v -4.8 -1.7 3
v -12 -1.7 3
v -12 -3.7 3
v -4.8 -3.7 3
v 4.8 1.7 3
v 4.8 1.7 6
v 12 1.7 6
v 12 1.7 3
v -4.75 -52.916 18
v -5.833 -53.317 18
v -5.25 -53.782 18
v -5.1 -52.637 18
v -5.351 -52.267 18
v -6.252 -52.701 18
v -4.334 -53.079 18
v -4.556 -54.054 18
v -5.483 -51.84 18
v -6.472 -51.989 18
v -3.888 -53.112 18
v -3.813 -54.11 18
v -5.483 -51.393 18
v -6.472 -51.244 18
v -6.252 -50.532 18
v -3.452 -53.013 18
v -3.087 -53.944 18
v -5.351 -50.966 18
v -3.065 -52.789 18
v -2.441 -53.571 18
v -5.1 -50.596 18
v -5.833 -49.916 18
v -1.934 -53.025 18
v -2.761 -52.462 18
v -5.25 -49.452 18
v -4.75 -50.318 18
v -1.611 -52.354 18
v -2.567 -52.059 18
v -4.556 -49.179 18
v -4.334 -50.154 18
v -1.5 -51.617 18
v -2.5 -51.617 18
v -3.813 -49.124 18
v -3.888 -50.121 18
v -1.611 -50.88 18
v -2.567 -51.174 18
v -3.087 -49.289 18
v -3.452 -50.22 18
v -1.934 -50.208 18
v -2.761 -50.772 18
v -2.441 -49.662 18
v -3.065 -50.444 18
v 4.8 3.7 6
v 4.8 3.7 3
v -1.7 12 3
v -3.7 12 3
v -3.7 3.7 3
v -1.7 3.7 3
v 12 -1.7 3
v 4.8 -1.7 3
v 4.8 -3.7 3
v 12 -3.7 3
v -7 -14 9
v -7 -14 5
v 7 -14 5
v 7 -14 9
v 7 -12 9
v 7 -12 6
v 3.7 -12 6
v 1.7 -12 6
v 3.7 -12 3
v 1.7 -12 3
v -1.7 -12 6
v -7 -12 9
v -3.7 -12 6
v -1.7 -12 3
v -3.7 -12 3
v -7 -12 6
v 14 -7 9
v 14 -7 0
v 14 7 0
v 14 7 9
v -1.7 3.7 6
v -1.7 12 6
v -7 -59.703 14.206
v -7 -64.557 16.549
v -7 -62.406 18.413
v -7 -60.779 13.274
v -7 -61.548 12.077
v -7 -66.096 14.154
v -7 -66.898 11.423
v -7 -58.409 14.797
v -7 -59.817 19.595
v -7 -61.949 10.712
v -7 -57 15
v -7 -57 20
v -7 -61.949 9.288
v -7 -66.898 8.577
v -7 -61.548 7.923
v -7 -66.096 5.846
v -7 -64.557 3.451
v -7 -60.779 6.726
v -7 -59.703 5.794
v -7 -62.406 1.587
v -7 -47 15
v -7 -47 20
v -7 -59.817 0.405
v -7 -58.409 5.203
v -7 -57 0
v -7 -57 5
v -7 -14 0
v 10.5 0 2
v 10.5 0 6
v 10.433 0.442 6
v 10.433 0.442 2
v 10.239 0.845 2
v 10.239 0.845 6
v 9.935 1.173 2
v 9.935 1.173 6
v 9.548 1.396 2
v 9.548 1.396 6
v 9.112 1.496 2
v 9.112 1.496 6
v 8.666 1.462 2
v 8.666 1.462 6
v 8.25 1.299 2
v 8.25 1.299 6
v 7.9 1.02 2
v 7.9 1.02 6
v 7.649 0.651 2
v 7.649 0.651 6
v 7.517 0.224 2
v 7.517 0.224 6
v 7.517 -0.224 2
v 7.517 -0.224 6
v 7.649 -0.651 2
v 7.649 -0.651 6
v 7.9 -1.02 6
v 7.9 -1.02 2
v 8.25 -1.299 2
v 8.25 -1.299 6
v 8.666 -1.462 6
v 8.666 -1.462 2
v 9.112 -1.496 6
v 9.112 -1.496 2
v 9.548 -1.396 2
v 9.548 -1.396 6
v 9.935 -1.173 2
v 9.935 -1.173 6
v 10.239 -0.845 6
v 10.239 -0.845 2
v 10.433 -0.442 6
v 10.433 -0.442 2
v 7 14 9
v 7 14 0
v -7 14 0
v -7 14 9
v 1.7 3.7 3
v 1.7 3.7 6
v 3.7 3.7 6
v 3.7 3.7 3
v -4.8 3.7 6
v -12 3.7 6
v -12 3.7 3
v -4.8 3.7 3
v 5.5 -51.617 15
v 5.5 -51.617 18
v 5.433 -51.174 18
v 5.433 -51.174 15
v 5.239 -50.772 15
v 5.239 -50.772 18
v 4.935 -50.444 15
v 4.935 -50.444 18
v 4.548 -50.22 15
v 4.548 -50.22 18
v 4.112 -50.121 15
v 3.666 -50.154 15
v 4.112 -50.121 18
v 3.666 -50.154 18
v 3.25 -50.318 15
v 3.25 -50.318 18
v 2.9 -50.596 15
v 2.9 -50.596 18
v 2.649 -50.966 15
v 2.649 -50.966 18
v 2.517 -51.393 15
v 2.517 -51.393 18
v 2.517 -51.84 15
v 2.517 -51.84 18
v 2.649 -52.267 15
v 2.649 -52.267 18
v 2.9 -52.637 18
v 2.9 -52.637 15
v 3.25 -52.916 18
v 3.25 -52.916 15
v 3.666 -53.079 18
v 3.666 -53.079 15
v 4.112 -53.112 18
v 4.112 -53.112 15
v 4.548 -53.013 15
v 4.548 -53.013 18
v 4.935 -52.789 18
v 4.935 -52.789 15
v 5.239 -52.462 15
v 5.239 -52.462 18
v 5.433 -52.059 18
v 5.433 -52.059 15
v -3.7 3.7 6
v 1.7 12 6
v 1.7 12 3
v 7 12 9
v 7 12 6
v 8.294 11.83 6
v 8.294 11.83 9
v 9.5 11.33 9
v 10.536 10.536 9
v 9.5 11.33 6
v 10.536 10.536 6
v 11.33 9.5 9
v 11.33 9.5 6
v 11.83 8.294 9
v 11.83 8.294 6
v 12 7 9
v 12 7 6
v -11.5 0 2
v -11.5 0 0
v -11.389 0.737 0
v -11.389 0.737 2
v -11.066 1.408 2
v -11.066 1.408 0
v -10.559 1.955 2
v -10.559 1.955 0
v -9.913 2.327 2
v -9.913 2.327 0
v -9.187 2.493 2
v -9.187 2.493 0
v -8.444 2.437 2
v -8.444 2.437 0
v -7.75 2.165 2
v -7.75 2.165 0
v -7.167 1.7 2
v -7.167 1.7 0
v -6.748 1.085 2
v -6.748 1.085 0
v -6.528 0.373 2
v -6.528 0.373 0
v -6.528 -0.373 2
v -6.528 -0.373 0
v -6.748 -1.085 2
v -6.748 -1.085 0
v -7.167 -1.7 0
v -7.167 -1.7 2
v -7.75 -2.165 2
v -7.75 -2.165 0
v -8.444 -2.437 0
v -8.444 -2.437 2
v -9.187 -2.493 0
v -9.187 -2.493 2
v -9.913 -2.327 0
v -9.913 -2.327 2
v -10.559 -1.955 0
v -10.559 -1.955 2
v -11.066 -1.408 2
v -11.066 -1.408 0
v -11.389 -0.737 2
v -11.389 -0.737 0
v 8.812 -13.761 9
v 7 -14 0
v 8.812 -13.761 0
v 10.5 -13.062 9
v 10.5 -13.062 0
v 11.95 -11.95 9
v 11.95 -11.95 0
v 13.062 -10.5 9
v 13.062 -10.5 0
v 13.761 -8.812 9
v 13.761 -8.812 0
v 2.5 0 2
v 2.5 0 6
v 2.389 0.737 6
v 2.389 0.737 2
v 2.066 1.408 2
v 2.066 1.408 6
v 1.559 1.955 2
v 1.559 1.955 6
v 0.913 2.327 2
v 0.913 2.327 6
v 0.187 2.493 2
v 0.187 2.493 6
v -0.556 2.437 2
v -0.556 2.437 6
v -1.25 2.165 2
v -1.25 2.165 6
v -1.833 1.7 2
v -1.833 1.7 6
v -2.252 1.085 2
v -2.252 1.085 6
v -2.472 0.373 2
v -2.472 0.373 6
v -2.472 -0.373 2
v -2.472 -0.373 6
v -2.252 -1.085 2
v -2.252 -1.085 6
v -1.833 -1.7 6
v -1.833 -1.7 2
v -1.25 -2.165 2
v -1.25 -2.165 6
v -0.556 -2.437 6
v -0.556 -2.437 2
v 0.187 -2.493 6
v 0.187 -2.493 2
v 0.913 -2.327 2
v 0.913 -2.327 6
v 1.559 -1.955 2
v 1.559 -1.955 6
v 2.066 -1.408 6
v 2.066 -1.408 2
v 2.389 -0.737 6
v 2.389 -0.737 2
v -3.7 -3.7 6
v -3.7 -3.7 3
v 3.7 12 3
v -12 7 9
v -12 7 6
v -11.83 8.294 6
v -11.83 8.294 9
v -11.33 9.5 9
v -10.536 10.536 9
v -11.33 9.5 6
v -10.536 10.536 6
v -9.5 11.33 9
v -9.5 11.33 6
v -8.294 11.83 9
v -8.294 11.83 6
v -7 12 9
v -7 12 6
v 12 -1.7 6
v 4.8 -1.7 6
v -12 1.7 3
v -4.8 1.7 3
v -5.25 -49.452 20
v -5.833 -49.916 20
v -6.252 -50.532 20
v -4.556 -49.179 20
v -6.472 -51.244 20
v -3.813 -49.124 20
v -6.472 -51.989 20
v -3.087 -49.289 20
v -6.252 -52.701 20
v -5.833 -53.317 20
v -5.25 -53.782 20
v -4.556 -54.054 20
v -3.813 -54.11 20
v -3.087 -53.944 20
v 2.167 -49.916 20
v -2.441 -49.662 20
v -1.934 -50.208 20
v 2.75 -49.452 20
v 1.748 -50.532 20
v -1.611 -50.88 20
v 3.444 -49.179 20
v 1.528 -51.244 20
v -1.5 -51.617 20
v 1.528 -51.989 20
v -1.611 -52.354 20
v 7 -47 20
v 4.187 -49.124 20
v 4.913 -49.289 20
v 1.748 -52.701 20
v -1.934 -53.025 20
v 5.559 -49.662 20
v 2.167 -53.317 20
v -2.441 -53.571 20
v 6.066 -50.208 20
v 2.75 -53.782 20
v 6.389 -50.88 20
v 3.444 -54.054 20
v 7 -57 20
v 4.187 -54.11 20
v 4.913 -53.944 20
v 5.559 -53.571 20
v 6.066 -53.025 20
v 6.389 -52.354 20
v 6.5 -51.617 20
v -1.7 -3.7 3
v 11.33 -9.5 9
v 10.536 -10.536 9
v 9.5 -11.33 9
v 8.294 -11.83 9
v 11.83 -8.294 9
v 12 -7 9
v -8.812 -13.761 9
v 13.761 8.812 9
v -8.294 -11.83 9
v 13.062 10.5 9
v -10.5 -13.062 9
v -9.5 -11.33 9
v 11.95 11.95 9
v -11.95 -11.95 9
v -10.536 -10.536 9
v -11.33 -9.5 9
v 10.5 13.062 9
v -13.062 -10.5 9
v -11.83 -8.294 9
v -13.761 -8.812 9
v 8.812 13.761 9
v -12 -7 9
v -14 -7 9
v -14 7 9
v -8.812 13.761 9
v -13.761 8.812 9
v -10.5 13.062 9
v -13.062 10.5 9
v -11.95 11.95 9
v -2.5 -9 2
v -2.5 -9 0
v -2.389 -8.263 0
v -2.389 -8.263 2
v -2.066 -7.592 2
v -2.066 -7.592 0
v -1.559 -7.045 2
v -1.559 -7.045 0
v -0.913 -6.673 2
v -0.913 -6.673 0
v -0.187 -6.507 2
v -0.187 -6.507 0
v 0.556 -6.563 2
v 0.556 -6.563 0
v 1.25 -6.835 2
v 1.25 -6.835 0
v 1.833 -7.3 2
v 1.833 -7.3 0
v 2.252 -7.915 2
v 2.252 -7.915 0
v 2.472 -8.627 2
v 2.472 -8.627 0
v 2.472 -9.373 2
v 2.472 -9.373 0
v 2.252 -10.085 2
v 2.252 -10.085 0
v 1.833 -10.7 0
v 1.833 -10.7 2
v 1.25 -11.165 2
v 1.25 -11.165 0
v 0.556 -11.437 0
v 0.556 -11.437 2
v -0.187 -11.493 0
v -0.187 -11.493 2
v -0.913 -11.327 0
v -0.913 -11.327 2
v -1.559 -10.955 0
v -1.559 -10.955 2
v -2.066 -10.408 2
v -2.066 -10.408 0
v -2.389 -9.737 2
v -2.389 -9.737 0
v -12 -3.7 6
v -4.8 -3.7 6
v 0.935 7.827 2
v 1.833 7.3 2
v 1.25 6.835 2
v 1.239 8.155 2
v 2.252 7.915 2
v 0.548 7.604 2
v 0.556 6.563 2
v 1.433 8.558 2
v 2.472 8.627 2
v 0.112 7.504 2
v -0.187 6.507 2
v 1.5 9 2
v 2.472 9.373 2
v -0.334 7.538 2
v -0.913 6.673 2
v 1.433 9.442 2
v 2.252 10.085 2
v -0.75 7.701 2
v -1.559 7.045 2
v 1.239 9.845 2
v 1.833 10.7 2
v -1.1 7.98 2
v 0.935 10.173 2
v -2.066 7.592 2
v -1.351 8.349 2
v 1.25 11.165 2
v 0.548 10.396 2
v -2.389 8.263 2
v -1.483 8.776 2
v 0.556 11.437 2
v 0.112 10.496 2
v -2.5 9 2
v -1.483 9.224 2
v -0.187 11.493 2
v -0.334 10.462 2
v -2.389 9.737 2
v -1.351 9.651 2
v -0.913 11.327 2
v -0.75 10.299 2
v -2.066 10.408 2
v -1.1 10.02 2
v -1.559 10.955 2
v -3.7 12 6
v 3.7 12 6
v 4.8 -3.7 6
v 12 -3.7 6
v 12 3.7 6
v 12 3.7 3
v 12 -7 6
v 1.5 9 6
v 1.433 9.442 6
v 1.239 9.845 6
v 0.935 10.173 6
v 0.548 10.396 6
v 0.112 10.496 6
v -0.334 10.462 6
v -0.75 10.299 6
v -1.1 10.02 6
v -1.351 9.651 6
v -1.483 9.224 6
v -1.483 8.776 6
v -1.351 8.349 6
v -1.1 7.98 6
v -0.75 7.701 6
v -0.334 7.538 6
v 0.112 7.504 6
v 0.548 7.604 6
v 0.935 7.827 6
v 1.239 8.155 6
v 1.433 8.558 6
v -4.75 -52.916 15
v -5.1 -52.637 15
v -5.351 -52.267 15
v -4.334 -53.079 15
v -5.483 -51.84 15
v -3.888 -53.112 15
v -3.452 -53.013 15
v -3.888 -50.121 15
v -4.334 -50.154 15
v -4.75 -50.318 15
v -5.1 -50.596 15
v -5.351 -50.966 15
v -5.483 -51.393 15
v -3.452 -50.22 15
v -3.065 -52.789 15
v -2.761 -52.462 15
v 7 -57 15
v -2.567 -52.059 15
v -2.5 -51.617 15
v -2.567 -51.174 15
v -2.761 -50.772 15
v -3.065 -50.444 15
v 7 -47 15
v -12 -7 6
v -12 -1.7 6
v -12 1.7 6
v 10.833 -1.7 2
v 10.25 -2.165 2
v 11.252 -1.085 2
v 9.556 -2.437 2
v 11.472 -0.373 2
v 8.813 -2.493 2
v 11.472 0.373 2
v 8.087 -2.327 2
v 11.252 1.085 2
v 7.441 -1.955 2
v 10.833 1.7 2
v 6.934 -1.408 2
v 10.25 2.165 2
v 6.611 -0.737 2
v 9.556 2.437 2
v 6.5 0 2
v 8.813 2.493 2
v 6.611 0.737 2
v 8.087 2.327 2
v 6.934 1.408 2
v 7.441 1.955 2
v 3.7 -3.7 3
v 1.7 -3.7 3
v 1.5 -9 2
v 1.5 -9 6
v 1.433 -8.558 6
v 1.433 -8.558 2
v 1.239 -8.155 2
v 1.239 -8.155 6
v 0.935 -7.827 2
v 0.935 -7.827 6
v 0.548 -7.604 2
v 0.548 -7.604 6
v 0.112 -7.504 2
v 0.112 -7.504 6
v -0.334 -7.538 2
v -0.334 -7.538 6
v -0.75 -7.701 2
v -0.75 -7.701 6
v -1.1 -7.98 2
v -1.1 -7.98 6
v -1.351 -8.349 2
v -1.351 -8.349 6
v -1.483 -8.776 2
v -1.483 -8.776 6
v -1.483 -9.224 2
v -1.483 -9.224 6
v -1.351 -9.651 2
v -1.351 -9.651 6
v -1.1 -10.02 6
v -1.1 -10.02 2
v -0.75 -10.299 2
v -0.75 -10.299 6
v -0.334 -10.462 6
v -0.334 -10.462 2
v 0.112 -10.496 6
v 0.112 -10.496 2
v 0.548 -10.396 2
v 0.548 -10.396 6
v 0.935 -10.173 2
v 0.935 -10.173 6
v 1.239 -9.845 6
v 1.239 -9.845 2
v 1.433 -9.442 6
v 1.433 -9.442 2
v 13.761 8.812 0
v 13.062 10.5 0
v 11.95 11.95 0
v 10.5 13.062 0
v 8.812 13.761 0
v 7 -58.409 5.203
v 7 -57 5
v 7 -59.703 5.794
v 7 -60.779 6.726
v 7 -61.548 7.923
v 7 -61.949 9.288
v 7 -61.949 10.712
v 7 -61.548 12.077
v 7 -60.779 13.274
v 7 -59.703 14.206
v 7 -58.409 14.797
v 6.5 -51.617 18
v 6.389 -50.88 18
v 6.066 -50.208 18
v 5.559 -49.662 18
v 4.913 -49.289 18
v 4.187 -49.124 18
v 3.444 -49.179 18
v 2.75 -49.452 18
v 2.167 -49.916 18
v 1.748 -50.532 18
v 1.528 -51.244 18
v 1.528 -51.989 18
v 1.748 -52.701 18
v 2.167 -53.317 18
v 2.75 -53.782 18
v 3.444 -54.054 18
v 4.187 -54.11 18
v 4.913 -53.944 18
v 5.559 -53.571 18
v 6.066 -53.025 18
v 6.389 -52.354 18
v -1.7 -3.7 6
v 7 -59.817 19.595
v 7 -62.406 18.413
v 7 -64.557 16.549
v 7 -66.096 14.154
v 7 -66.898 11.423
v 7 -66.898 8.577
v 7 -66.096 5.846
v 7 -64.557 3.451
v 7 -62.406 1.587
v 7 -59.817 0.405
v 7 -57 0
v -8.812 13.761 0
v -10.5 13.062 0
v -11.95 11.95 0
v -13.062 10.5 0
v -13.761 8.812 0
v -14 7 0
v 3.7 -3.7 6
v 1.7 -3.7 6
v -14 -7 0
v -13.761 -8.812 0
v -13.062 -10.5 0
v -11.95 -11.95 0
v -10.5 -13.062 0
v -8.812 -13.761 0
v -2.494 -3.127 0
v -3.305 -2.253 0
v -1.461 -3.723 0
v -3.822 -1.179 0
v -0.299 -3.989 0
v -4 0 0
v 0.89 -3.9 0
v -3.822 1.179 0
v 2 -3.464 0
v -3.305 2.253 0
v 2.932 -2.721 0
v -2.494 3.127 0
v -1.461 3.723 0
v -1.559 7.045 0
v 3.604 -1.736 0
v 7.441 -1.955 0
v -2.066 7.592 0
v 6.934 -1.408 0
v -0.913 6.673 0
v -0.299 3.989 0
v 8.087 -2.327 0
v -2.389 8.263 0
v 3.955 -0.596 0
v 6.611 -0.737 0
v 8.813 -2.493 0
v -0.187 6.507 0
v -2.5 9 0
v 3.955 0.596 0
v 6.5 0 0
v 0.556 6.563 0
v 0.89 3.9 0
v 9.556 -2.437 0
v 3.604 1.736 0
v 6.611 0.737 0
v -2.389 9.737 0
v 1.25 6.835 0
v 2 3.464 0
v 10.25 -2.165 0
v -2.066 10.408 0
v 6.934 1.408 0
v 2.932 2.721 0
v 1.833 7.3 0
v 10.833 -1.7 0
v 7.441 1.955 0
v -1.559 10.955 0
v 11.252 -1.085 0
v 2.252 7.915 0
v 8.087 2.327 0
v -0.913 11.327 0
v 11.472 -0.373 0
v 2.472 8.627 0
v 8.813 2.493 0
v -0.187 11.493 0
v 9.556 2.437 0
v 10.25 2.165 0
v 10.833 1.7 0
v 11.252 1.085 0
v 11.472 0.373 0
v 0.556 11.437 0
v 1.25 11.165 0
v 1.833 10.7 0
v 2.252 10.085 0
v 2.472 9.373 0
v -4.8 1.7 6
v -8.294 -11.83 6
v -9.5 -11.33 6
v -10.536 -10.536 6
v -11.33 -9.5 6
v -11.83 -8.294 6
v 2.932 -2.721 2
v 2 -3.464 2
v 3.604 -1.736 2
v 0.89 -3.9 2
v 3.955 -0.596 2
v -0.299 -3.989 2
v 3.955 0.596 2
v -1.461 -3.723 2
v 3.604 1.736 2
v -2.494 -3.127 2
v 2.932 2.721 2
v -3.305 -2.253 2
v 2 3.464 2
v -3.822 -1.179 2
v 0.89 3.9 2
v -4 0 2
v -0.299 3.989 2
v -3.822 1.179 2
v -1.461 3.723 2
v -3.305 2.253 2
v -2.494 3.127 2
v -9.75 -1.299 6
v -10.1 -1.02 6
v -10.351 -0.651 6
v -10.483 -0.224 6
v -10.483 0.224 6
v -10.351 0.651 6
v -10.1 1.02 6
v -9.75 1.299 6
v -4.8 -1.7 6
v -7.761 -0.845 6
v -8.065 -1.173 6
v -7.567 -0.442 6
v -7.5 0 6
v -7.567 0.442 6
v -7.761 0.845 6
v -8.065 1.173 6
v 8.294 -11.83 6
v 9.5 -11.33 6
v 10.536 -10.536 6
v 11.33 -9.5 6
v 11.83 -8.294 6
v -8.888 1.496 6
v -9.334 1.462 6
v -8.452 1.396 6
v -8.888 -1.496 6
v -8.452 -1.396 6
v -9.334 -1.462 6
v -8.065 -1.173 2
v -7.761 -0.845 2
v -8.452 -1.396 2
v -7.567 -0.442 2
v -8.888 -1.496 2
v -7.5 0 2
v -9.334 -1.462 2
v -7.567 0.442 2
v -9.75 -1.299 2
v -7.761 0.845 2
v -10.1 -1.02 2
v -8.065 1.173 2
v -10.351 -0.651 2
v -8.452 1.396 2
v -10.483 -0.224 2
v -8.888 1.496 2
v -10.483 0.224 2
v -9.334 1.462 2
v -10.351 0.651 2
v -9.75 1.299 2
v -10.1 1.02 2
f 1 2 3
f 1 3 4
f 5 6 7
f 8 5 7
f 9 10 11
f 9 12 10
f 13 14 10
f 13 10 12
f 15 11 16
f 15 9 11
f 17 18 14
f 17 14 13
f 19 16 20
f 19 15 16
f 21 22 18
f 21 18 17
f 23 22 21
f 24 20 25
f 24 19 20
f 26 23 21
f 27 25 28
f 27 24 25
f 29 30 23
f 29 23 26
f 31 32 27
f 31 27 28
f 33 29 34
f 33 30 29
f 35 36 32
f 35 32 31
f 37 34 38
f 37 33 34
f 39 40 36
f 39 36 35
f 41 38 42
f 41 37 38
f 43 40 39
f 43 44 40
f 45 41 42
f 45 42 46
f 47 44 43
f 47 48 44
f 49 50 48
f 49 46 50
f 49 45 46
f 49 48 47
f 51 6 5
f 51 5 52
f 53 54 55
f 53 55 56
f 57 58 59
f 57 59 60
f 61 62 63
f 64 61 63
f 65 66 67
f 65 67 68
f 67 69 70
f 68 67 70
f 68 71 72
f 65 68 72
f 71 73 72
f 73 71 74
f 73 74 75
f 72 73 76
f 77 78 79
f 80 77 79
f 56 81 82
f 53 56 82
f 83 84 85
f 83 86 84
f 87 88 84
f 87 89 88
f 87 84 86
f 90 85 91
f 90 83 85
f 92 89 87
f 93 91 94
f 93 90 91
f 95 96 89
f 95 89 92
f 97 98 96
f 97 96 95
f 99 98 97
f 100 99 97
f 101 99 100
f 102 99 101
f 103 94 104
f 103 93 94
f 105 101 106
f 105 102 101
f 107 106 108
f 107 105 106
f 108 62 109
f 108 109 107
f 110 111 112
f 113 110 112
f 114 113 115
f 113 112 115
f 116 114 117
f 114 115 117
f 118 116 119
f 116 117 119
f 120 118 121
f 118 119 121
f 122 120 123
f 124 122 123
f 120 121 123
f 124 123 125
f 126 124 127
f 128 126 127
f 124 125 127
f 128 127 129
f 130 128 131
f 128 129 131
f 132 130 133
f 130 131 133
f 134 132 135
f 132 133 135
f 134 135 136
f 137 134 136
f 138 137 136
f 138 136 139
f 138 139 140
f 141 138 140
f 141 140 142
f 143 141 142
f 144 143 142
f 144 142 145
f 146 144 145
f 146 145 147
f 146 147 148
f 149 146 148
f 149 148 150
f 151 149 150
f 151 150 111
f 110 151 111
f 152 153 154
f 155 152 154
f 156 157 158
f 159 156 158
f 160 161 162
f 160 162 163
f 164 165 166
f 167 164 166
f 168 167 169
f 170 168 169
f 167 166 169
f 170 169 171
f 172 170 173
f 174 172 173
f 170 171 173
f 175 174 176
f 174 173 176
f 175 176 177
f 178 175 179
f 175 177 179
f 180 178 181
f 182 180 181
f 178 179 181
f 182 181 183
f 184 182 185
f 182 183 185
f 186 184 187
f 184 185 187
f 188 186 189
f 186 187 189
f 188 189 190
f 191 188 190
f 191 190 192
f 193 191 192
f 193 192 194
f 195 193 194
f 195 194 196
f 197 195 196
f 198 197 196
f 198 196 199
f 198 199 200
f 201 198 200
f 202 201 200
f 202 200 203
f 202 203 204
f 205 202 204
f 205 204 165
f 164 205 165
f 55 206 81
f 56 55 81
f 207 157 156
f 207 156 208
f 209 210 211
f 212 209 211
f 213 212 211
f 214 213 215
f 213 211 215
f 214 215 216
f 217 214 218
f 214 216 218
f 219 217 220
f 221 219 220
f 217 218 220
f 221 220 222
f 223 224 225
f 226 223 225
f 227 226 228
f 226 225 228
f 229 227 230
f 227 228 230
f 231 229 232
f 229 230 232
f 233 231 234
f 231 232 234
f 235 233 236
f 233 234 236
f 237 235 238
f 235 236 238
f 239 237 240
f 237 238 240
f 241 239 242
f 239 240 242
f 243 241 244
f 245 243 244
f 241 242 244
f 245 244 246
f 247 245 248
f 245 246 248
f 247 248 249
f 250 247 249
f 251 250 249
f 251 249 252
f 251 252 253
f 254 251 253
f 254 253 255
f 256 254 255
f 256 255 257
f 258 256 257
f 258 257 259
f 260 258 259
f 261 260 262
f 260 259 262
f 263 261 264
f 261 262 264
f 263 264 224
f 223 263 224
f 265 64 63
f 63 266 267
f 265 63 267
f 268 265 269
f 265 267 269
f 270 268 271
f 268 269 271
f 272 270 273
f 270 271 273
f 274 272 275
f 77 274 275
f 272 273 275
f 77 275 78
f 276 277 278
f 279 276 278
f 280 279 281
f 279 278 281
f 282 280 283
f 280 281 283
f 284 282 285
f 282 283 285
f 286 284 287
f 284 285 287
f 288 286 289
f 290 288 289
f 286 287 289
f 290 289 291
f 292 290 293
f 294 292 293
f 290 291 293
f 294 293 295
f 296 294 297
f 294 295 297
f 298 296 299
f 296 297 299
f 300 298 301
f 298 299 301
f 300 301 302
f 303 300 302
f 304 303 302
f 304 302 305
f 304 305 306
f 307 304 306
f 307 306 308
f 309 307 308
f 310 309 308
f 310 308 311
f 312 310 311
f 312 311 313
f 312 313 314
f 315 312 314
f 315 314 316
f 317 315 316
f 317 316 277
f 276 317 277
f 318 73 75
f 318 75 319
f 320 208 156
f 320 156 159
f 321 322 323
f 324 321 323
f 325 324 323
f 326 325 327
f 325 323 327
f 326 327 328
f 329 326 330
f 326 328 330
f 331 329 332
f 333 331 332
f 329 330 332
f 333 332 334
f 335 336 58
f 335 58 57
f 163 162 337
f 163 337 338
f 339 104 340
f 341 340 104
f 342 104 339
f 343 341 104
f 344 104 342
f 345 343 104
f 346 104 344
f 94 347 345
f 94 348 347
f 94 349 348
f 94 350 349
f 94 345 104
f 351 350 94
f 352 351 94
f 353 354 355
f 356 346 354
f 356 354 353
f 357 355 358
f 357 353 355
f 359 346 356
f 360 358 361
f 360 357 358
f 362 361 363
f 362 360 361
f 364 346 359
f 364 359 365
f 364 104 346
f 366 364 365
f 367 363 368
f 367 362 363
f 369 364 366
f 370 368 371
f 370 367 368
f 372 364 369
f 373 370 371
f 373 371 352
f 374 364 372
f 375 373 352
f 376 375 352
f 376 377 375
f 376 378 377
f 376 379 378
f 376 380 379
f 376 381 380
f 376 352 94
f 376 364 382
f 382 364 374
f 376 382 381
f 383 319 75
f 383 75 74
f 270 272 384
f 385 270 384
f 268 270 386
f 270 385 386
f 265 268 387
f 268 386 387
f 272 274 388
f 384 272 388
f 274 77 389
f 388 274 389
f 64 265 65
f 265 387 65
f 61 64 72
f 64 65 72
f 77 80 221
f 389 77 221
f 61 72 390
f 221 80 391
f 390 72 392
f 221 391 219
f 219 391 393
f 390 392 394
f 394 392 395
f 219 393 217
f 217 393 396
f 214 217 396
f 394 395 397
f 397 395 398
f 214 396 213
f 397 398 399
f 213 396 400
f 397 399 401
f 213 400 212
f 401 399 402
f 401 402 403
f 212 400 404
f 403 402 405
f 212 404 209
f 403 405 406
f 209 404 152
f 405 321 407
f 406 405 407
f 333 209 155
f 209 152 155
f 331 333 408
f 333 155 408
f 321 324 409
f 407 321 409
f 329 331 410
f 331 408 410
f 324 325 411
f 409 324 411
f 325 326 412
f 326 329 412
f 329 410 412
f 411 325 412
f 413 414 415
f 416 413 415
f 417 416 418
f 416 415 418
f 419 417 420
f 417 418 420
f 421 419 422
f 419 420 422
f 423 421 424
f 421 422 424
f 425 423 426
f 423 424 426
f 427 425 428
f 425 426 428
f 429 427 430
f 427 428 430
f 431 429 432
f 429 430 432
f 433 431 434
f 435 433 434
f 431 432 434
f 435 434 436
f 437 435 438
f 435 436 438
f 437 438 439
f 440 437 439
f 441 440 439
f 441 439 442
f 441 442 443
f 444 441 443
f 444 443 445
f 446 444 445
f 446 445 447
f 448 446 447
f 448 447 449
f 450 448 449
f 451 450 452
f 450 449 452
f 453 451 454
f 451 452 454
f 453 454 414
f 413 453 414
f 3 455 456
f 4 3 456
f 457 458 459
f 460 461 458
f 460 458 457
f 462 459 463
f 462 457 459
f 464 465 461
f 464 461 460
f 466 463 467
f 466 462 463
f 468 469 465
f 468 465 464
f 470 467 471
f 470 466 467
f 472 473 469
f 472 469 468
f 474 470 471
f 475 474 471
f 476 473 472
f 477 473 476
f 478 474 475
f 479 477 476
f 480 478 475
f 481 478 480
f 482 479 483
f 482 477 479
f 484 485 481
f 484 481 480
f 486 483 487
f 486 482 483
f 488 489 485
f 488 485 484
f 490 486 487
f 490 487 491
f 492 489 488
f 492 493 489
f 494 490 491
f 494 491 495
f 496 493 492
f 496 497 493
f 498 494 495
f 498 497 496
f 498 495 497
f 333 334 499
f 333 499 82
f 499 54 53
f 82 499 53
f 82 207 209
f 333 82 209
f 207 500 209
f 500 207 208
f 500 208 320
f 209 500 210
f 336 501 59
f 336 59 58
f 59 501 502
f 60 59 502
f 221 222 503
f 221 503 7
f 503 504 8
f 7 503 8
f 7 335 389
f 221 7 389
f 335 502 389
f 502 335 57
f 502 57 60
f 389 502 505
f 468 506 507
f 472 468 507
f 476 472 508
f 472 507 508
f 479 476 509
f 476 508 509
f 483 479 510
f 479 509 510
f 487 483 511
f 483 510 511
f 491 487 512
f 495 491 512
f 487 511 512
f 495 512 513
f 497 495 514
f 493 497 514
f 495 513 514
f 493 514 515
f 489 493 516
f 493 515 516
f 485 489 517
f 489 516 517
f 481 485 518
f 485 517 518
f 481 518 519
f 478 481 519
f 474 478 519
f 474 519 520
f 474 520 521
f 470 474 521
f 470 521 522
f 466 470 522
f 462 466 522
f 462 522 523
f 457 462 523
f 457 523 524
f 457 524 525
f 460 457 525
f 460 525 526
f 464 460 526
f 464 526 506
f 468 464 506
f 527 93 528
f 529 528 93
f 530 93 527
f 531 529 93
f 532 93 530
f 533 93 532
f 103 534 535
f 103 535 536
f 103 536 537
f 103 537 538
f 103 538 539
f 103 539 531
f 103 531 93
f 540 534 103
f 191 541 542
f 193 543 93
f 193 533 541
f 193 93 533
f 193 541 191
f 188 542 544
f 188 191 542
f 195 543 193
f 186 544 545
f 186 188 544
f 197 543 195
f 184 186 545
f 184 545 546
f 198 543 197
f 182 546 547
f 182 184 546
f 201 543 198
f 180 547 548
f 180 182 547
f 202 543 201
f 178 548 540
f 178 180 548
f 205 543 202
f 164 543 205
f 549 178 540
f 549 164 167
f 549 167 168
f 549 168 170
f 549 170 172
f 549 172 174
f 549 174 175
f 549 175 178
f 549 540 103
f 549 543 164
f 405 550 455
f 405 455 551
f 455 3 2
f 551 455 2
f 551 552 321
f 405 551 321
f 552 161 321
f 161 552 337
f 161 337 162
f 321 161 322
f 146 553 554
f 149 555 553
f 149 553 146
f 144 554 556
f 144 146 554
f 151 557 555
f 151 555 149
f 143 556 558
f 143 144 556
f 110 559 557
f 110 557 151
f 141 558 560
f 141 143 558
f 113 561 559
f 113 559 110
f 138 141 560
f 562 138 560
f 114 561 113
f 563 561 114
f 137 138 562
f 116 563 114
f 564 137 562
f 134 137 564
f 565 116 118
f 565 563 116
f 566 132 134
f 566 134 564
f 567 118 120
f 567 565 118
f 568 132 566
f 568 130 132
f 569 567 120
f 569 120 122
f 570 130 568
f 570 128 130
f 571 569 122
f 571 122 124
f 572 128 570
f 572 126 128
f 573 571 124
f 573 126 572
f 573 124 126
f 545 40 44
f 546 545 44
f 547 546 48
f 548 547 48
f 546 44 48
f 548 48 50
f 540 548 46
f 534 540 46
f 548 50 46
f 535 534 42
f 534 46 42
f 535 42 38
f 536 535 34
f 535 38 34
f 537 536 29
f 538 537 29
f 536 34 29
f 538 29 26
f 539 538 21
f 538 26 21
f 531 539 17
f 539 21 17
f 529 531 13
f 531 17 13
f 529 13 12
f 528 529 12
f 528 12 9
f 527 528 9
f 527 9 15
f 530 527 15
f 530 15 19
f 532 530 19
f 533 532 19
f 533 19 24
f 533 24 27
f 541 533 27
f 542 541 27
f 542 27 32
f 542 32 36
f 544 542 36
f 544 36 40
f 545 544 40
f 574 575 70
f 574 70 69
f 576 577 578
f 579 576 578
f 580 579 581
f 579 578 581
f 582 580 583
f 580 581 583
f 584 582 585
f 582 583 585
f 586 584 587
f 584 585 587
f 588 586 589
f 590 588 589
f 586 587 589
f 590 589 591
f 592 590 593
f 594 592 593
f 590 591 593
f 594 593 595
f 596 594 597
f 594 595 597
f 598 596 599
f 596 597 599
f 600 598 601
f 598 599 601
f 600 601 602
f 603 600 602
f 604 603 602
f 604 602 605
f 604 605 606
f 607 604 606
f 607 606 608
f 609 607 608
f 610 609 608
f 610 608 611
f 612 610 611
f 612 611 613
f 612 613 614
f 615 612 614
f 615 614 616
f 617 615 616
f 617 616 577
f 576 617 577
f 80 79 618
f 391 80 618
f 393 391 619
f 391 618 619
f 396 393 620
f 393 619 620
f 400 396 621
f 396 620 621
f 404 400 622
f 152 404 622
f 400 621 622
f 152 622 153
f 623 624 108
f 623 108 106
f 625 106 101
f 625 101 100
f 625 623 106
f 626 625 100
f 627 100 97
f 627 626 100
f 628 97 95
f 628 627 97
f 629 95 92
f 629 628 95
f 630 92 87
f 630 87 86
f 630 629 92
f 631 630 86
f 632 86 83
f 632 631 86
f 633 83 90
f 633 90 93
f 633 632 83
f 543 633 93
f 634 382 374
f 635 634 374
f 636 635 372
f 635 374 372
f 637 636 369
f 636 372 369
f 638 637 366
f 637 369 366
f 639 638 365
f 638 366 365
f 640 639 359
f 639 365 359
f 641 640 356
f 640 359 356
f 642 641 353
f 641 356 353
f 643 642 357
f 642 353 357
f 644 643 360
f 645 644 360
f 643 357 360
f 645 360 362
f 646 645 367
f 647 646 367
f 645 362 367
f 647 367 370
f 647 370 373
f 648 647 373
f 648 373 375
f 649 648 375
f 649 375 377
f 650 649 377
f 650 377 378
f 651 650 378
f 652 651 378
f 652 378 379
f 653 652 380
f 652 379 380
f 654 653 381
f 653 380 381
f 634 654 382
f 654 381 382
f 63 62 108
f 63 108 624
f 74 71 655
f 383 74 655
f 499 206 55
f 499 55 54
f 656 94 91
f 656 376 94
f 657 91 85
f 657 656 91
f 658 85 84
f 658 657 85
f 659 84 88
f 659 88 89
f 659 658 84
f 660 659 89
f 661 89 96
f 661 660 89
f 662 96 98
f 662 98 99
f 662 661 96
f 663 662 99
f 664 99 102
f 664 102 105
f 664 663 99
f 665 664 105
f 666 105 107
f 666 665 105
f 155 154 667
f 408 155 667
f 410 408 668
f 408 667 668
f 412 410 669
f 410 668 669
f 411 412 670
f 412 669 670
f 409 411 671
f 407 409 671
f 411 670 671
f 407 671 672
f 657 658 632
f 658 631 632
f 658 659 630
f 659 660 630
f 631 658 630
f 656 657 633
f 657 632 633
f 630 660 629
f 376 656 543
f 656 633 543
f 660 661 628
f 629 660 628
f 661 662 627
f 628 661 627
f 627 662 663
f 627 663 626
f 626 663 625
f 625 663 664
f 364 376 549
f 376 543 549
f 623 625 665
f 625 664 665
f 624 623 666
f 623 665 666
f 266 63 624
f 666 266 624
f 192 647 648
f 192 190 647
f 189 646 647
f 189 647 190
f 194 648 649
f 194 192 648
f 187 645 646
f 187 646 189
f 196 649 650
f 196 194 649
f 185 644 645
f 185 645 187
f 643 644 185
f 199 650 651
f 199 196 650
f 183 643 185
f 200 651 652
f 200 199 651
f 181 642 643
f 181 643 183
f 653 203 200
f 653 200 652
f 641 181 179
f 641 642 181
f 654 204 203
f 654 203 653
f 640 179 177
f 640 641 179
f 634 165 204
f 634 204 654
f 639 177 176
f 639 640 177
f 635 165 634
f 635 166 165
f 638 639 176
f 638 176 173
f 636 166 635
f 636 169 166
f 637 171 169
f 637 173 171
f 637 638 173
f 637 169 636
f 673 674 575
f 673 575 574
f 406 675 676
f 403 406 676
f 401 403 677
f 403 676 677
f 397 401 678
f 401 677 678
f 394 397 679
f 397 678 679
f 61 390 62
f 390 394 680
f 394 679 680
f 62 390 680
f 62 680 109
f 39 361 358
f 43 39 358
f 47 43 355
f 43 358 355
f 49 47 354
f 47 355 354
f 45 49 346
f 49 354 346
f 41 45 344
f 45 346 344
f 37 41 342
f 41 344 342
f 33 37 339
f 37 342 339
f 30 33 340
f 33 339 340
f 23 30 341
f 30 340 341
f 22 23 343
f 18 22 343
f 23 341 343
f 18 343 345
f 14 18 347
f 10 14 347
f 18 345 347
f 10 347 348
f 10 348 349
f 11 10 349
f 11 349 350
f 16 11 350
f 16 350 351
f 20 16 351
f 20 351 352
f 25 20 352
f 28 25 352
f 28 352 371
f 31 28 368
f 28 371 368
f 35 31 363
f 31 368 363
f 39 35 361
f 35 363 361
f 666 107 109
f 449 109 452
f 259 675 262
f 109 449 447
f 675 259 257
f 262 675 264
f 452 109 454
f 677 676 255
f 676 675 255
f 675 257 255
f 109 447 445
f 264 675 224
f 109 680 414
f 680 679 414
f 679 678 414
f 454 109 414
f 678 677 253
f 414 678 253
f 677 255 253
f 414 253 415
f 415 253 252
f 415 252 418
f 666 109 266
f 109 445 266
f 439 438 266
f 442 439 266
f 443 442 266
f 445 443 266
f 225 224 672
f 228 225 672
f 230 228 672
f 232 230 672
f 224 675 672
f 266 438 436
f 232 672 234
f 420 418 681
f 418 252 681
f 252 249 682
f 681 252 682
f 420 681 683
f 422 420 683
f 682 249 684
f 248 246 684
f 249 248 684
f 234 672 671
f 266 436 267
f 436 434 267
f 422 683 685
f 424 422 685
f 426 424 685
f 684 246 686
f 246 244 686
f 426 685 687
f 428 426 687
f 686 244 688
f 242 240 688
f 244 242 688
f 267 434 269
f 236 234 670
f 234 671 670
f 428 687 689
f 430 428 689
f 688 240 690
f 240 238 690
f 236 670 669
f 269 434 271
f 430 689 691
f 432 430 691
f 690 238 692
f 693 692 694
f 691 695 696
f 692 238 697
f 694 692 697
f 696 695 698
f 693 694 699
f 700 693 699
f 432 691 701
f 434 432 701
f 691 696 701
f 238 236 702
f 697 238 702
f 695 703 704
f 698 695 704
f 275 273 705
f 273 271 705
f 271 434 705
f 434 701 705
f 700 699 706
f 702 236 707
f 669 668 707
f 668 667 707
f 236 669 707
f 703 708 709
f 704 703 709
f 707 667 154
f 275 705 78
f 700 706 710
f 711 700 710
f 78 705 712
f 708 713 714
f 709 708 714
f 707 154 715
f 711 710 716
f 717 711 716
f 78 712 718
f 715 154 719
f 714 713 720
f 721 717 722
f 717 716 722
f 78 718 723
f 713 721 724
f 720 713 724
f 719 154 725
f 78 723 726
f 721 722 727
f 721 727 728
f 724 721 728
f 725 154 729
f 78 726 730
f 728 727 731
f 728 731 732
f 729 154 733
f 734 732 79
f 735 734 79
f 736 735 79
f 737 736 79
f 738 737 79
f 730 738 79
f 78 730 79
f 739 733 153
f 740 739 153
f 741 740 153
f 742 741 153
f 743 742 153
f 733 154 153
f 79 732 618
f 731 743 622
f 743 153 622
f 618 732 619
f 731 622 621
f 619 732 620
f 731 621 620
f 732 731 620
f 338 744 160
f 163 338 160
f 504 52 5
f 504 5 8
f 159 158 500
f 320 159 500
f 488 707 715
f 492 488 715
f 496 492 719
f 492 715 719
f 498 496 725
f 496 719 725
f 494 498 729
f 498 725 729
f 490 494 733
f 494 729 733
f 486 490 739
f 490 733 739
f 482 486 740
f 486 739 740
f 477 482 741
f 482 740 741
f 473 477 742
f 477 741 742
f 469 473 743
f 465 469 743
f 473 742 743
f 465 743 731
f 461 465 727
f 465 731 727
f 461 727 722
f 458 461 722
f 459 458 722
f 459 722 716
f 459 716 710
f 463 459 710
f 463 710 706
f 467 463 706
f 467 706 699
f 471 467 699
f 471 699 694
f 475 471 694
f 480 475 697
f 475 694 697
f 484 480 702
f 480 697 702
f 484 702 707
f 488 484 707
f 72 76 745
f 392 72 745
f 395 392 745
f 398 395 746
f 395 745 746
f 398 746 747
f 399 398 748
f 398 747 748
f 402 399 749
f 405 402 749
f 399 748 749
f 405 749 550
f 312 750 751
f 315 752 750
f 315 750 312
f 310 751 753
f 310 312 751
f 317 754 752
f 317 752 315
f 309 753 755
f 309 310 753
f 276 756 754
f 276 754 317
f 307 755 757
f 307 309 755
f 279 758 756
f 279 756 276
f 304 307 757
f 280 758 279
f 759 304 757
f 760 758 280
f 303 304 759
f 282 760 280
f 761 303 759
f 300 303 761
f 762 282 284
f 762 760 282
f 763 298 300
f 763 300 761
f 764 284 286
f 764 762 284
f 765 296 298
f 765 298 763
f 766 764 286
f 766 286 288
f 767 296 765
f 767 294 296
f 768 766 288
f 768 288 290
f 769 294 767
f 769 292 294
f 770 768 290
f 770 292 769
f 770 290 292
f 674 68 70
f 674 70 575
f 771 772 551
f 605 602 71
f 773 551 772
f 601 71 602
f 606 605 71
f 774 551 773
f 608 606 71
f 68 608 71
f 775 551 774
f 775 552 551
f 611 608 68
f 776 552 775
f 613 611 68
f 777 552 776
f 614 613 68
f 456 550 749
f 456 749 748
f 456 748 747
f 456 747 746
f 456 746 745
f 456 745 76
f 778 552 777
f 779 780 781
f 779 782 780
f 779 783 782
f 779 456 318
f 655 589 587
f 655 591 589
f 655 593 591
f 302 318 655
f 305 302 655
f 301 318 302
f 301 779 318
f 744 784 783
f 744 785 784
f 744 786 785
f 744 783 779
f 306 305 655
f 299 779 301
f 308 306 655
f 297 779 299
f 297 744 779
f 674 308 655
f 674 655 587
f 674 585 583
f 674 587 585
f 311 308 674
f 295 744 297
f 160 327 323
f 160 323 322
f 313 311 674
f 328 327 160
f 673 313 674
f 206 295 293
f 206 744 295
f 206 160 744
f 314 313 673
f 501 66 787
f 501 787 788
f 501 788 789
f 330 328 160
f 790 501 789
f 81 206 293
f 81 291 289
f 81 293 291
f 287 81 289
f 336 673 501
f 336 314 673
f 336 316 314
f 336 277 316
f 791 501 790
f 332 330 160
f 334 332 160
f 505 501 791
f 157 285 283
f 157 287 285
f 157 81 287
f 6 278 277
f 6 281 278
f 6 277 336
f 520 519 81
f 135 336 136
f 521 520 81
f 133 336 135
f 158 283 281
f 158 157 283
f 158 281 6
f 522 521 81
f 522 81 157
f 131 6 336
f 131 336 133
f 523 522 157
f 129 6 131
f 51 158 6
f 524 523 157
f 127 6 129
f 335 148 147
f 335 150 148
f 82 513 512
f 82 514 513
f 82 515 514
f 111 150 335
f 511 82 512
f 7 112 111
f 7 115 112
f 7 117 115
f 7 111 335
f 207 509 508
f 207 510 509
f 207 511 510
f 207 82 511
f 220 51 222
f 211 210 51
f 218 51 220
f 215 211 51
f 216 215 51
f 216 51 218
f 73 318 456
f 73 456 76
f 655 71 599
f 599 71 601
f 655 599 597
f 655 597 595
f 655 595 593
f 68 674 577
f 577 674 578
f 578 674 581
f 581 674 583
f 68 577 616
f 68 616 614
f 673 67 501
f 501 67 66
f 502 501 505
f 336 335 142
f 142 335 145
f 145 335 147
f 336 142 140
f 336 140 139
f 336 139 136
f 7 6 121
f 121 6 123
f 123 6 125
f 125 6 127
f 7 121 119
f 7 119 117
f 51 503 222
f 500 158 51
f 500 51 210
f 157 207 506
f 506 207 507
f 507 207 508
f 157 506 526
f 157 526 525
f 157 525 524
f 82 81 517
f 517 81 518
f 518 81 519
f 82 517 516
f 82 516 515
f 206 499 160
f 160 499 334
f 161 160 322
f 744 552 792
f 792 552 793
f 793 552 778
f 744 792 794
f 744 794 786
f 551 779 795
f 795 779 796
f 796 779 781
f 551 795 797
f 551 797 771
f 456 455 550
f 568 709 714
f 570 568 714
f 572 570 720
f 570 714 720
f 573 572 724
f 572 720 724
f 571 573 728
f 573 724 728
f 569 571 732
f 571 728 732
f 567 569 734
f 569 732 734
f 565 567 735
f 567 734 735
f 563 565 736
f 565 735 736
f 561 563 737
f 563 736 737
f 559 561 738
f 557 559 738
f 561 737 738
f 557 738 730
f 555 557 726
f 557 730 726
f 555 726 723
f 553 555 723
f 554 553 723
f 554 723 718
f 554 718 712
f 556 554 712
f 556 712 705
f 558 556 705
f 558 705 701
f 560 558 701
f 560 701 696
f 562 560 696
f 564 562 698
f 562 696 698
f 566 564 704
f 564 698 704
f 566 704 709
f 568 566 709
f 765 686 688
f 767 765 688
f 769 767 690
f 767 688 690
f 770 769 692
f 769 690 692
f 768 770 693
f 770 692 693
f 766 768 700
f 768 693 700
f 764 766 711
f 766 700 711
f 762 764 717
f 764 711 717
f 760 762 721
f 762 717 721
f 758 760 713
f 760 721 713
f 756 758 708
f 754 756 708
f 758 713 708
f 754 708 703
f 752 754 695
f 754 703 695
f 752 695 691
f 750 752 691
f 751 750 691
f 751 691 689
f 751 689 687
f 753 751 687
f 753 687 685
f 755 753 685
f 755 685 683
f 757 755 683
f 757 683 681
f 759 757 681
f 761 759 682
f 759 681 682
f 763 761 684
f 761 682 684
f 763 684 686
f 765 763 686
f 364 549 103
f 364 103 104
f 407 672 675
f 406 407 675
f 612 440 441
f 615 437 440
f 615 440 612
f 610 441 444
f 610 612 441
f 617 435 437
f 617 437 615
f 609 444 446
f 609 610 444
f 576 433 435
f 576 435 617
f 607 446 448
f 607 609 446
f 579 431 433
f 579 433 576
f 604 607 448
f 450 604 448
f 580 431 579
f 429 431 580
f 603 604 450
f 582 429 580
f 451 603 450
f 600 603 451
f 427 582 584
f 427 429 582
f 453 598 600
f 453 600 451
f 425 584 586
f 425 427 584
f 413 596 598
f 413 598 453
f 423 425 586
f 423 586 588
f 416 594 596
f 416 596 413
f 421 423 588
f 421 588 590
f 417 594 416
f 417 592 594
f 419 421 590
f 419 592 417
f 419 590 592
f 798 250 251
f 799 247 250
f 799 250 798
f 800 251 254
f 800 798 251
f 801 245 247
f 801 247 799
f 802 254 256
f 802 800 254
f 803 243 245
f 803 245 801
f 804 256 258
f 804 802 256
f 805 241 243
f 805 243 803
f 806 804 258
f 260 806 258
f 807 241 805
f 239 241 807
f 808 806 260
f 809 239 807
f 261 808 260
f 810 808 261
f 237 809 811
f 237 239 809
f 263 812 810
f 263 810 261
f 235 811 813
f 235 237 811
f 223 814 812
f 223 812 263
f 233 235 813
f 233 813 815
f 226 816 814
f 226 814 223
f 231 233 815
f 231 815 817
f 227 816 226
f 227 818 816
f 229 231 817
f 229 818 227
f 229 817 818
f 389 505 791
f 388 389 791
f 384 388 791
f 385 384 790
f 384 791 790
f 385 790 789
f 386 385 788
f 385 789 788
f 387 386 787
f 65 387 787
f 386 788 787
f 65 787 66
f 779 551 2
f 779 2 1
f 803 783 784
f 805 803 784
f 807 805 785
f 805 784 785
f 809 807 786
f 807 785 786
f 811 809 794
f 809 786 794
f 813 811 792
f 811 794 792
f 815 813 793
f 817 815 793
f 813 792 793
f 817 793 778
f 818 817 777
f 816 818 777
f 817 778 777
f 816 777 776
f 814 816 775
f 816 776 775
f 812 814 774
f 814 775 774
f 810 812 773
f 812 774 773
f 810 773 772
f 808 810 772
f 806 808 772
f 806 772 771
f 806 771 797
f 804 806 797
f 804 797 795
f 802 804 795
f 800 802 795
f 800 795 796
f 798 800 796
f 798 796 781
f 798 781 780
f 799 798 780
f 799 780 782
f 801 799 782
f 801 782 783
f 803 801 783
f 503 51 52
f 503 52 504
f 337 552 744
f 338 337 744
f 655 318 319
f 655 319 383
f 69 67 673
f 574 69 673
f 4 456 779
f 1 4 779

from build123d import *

# Parameters (mm, degrees)
Y_KSEKLIK_EKSTR_ZYON1_DEPTH = 9
Y_KSEKLIK_EKSTR_ZYON2_DEPTH = 6
IZIM4_R                     = 1.5
IZIM4_R_2                   = 2.5
KES_EKSTR_ZYON2_DEPTH       = 6.5
IZIM5_W                     = 14
IZIM5_H                     = 15
Y_KSEKLIK_EKSTR_ZYON3_DEPTH = 5
Y_KSEKLIK_EKSTR_ZYON4_DEPTH = 7
IZIM3_W                     = 7.2
IZIM3_H                     = 2
IZIM3_W_2                   = 2
IZIM3_H_2                   = 8.3
KES_EKSTR_ZYON3_DEPTH       = 3
IZIM8_R                     = 1.5
KES_EKSTR_ZYON5_DEPTH       = 10
IZIM9_R                     = 2.5
IZIM9_R_2                   = 4
KES_EKSTR_ZYON6_DEPTH       = 2
IZIM10_R                    = 2.5
KES_EKSTR_ZYON7_DEPTH       = 2
KES_EKSTR_ZYON8_START       = -10
KES_EKSTR_ZYON8_DEPTH       = 10
IZIM12_W                    = 14
IZIM12_H                    = 3
Y_KSEKLIK_EKSTR_ZYON5_DEPTH = 5


with BuildPart() as part:
    # Çizim1 → Yükseklik-Ekstrüzyon1 (new body)
    with BuildSketch(Plane.XY):
        with BuildLine():
            Line((17, 7), (17, -7))
            ThreePointArc((17, -7), (14.071067812, -14.071067812), (7, -17))
            Line((7, -17), (-7, -17))
            ThreePointArc((-7, -17), (-14.071067812, -14.071067812), (-17, -7))
            Line((-17, -7), (-17, 7))
            ThreePointArc((-17, 7), (-14.071067812, 14.071067812), (-7, 17))
            Line((-7, 17), (7, 17))
            ThreePointArc((7, 17), (14.071067812, 14.071067812), (17, 7))
        make_face()
        with BuildLine():
            Line((-7, 12), (7, 12))
            ThreePointArc((7, 12), (10.535533906, 10.535533906), (12, 7))
            Line((12, 7), (12, -7))
            ThreePointArc((12, -7), (10.535533906, -10.535533906), (7, -12))
            Line((7, -12), (-7, -12))
            ThreePointArc((-7, -12), (-10.535533906, -10.535533906), (-12, -7))
            Line((-12, -7), (-12, 7))
            ThreePointArc((-12, 7), (-10.535533906, 10.535533906), (-7, 12))
        make_face(mode=Mode.SUBTRACT)
    extrude(amount=Y_KSEKLIK_EKSTR_ZYON1_DEPTH)

    # Çizim2 → Yükseklik-Ekstrüzyon2 (add)
    with BuildSketch(Plane.XY):
        with BuildLine():
            Line((-7, -12), (7, -12))
            ThreePointArc((7, -12), (10.535533906, -10.535533906), (12, -7))
            Line((12, -7), (12, 7))
            ThreePointArc((12, 7), (10.535533906, 10.535533906), (7, 12))
            Line((7, 12), (-7, 12))
            ThreePointArc((-7, 12), (-10.535533906, 10.535533906), (-12, 7))
            Line((-12, 7), (-12, -7))
            ThreePointArc((-12, -7), (-10.535533906, -10.535533906), (-7, -12))
        make_face()
    extrude(amount=Y_KSEKLIK_EKSTR_ZYON2_DEPTH)

    # Çizim4 → Kes-Ekstrüzyon2 (cut)
    with BuildSketch(Plane.XY.offset(6)):
        with Locations((0, 9)):
            Circle(IZIM4_R)
        Circle(IZIM4_R_2)
        with Locations((9, 0)):
            Circle(IZIM4_R)
        with Locations((0, -9)):
            Circle(IZIM4_R)
        with Locations((-9, 0)):
            Circle(IZIM4_R)
    extrude(amount=-KES_EKSTR_ZYON2_DEPTH, mode=Mode.SUBTRACT)

    # Çizim5 → Yükseklik-Ekstrüzyon3 (add)
    with BuildSketch(Plane.XY):
        with Locations((0, -24.5)):
            Rectangle(IZIM5_W, IZIM5_H)
    extrude(amount=Y_KSEKLIK_EKSTR_ZYON3_DEPTH)

    # Çizim6 → Yükseklik-Ekstrüzyon4 (add, symmetric)
    with BuildSketch(Plane(origin=(0, 0, 0), x_dir=(0, 0, -1), z_dir=(1, 0, 0))):
        with BuildLine():
            Line((0, -32), (-5, -32))
            Line((-5, -32), (-5, -57))
            ThreePointArc((-5, -57), (-10, -62), (-15, -57))
            Line((-15, -57), (-15, -47))
            Line((-15, -47), (-20, -47))
            Line((-20, -47), (-20, -57))
            ThreePointArc((-20, -57), (-10, -67), (0, -57))
            Line((0, -57), (0, -32))
        make_face()
    extrude(amount=Y_KSEKLIK_EKSTR_ZYON4_DEPTH, both=True)

    # Çizim3 → Kes-Ekstrüzyon3 (cut)
    with BuildSketch(Plane.XY.offset(6)):
        with Locations((8.4, 2.7)):
            Rectangle(IZIM3_W, IZIM3_H)
        with Locations((2.7, 7.85)):
            Rectangle(IZIM3_W_2, IZIM3_H_2)
        with Locations((-2.7, 7.85)):
            Rectangle(IZIM3_W_2, IZIM3_H_2)
        with Locations((-8.4, 2.7)):
            Rectangle(IZIM3_W, IZIM3_H)
        with Locations((-8.4, -2.7)):
            Rectangle(IZIM3_W, IZIM3_H)
        with Locations((-2.7, -7.85)):
            Rectangle(IZIM3_W_2, IZIM3_H_2)
        with Locations((2.7, -7.85)):
            Rectangle(IZIM3_W_2, IZIM3_H_2)
        with Locations((8.4, -2.7)):
            Rectangle(IZIM3_W, IZIM3_H)
    extrude(amount=-KES_EKSTR_ZYON3_DEPTH, mode=Mode.SUBTRACT)

    # Çizim8 → Kes-Ekstrüzyon5 (cut)
    with BuildSketch(Plane.XY.offset(20)):
        with Locations((-4, -51.616632033)):
            Circle(IZIM8_R)
        with Locations((4, -51.616632033)):
            Circle(IZIM8_R)
    extrude(amount=-KES_EKSTR_ZYON5_DEPTH, mode=Mode.SUBTRACT)

    # Çizim9 → Kes-Ekstrüzyon6 (cut)
    with BuildSketch(Plane(origin=(0, 0, 0), x_dir=(-1, 0, 0), z_dir=(0, 0, -1))):
        with Locations((0, 9)):
            Circle(IZIM9_R)
        Circle(IZIM9_R_2)
        with Locations((9, 0)):
            Circle(IZIM9_R)
        with Locations((0, -9)):
            Circle(IZIM9_R)
        with Locations((-9, 0)):
            Circle(IZIM9_R)
    extrude(amount=-KES_EKSTR_ZYON6_DEPTH, mode=Mode.SUBTRACT)

    # Çizim10 → Kes-Ekstrüzyon7 (cut)
    with BuildSketch(Plane.XY.offset(20)):
        with Locations((-4, -51.616632033)):
            Circle(IZIM10_R)
        with Locations((4, -51.616632033)):
            Circle(IZIM10_R)
    extrude(amount=-KES_EKSTR_ZYON7_DEPTH, mode=Mode.SUBTRACT)

    # Çizim11 → Kes-Ekstrüzyon8 (cut)
    with BuildSketch(Plane.XY.offset(9).offset(KES_EKSTR_ZYON8_START)):
        with BuildLine():
            Line((7, 17), (-7, 17))
            ThreePointArc((-7, 17), (-14.071067812, 14.071067812), (-17, 7))
            Line((-17, 7), (-17, -7))
            ThreePointArc((-17, -7), (-14.071067812, -14.071067812), (-7, -17))
            Line((-7, -17), (7, -17))
            ThreePointArc((7, -17), (14.071067812, -14.071067812), (17, -7))
            Line((17, -7), (17, 7))
            ThreePointArc((17, 7), (14.071067812, 14.071067812), (7, 17))
        make_face()
        with BuildLine():
            Line((7, 14), (-7, 14))
            ThreePointArc((-7, 14), (-11.949747468, 11.949747468), (-14, 7))
            Line((-14, 7), (-14, -7))
            ThreePointArc((-14, -7), (-11.949747468, -11.949747468), (-7, -14))
            Line((-7, -14), (7, -14))
            ThreePointArc((7, -14), (11.949747468, -11.949747468), (14, -7))
            Line((14, -7), (14, 7))
            ThreePointArc((14, 7), (11.949747468, 11.949747468), (7, 14))
        make_face(mode=Mode.SUBTRACT)
    extrude(amount=KES_EKSTR_ZYON8_DEPTH, mode=Mode.SUBTRACT)


with BuildPart() as kes_ekstr_zyon8_piece_1:
    # of the separate pieces the step leaves, piece 1, a body of its own (kes_ekstr_zyon8_pieces)
    add(part.part.solids().sort_by_distance((-7, -57, 0))[0])



with BuildPart() as kes_ekstr_zyon8_piece_2:
    # of the separate pieces the step leaves, piece 2, a body of its own (kes_ekstr_zyon8_pieces)
    add(part.part.solids().sort_by_distance((7, 14, 0))[0])


with BuildPart() as kes_ekstr_zyon8_piece_1_1:
    add(kes_ekstr_zyon8_piece_1.part)

    add(kes_ekstr_zyon8_piece_2.part)  # Yükseklik-Ekstrüzyon5 merges Kes-Ekstrüzyon8 piece 2
    # Çizim12 → Yükseklik-Ekstrüzyon5 (add)
    with BuildSketch(Plane.XY):
        with Locations((0, -15.5)):
            Rectangle(IZIM12_W, IZIM12_H)
    extrude(amount=Y_KSEKLIK_EKSTR_ZYON5_DEPTH)


solid = kes_ekstr_zyon8_piece_1_1.part
